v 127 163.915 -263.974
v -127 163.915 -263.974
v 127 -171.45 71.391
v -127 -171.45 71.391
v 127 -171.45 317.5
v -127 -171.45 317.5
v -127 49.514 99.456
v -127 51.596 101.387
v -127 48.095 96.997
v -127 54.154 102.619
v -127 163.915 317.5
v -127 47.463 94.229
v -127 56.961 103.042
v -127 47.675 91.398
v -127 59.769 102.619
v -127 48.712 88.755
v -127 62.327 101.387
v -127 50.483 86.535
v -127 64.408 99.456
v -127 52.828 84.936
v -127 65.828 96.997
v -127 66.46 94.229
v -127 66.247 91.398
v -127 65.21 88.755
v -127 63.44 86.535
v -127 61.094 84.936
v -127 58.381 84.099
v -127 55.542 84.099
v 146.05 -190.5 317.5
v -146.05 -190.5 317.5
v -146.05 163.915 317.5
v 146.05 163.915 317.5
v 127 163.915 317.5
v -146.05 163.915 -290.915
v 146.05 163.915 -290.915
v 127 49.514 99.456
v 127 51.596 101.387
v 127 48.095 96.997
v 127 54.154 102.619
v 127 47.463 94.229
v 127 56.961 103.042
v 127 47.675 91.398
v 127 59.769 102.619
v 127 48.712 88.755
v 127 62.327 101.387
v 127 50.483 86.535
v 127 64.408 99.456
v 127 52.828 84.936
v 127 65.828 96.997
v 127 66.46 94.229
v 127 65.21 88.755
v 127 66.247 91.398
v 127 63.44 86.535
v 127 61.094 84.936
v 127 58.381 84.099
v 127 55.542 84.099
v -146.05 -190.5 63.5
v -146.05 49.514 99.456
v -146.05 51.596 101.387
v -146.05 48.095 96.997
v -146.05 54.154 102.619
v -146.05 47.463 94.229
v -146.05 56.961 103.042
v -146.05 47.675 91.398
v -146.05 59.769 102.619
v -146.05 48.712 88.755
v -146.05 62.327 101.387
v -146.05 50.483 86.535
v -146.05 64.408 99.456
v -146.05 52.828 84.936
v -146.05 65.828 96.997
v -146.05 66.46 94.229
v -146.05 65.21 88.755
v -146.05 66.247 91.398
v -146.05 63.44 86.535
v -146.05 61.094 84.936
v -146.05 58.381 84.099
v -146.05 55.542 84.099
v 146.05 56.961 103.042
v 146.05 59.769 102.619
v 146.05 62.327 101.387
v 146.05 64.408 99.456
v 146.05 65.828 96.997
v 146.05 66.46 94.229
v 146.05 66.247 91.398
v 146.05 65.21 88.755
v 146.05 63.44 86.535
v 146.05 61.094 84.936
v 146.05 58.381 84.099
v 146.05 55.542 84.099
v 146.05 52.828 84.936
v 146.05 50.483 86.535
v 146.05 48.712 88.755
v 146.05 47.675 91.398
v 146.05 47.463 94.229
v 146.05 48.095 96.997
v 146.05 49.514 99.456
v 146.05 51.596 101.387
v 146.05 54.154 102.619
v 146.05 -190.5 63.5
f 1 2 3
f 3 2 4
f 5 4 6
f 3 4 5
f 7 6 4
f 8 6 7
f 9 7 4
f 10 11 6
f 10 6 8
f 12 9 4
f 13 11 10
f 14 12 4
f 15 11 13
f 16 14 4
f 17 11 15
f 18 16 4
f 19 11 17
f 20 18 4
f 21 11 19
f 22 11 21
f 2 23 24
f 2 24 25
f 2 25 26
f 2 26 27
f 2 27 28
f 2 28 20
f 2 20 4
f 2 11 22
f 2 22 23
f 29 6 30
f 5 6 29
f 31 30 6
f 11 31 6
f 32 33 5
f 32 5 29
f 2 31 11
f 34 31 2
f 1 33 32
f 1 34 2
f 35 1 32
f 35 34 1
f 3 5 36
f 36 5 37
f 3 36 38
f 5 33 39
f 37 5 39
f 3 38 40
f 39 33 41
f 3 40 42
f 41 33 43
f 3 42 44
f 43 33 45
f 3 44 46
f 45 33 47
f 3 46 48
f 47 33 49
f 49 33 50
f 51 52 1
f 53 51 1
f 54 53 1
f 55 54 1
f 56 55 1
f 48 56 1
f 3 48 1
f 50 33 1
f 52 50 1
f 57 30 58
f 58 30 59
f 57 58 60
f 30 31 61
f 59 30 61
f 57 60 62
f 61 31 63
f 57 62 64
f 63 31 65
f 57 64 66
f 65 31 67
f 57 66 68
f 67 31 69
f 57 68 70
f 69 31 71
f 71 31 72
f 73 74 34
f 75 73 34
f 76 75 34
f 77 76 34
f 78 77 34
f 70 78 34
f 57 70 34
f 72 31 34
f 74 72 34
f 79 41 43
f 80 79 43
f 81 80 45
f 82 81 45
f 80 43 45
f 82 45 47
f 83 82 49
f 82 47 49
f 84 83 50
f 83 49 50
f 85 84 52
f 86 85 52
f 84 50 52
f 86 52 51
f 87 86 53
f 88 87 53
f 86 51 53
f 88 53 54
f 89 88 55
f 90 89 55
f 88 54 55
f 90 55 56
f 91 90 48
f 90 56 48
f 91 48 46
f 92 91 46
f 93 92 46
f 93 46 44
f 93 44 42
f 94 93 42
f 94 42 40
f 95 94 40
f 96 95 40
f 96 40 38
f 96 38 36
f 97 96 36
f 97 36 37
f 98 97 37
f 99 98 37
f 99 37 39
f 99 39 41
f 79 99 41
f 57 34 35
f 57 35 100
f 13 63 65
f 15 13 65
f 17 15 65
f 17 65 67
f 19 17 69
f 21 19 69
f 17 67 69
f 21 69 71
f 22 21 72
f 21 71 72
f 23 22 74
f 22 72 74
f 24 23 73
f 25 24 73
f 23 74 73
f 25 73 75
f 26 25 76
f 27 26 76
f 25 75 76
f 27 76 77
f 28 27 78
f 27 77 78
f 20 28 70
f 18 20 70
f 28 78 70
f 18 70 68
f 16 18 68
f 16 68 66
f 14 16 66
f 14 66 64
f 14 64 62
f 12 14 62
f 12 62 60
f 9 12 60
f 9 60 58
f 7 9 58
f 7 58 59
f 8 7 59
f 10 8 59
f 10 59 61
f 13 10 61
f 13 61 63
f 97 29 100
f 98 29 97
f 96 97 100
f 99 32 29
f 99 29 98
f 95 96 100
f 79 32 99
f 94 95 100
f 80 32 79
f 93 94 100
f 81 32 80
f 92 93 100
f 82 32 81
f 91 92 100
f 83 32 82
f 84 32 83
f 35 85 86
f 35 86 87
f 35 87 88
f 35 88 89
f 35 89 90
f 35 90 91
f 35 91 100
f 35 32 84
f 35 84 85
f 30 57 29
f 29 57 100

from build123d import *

# Parameters (mm, degrees)
SKETCH2_W           = 292.1
SKETCH2_H           = 635
BOSS_EXTRUDE1_DEPTH = 190.5
CUT_EXTRUDE2_DEPTH  = 381
SHELL1_T            = -19.05
SKETCH5_W           = 292.1
SKETCH5_H           = 635
CUT_EXTRUDE3_DEPTH  = 24.892
SKETCH6_R           = 9.525
CUT_EXTRUDE4_DEPTH  = 514.096
SKETCH10_W          = 292.1
SKETCH10_H          = 610.108
CUT_EXTRUDE7_DEPTH  = 1.693333333


with BuildPart() as part:
    # Sketch2 → Boss-Extrude1 (new body, symmetric)
    with BuildSketch(Plane(origin=(0, 0, 0), x_dir=(1, 0, 0), z_dir=(0, 1, 0))):
        Rectangle(SKETCH2_W, SKETCH2_H)
    extrude(amount=BOSS_EXTRUDE1_DEPTH, both=True)

    # Sketch4 → Cut-Extrude2 (cut)
    with BuildSketch(Plane.ZY.offset(146.05)):
        Polygon((-317.5, 190.5), (63.5, -190.5), (-317.5, -190.5), align=None)
    extrude(amount=-CUT_EXTRUDE2_DEPTH, mode=Mode.SUBTRACT)

    # Shell1
    shell1_openings = [part.faces().sort_by_distance(p)[0] for p in [
        (0, 0, 317.5),
    ]]
    offset(amount=SHELL1_T, openings=shell1_openings, kind=Kind.INTERSECTION)

    # Sketch5 → Cut-Extrude3 (cut)
    with BuildSketch(Plane(origin=(0, 190.5, 0), x_dir=(1, 0, 0), z_dir=(0, 1, 0))):
        Rectangle(SKETCH5_W, SKETCH5_H)
    extrude(amount=-CUT_EXTRUDE3_DEPTH, mode=Mode.SUBTRACT)

    # Sketch6 → Cut-Extrude4 (cut)
    with BuildSketch(Plane.ZY.offset(146.05)):
        with Locations((93.517292524, 56.961208915)):
            Circle(SKETCH6_R)
    extrude(amount=-CUT_EXTRUDE4_DEPTH, mode=Mode.SUBTRACT)

    # Sketch10 → Cut-Extrude7 (cut)
    with BuildSketch(Plane(origin=(0, 165.608, 0), x_dir=(1, 0, 0), z_dir=(0, 1, 0))):
        with Locations((0, -12.446)):
            Rectangle(SKETCH10_W, SKETCH10_H)
    extrude(amount=-CUT_EXTRUDE7_DEPTH, mode=Mode.SUBTRACT)


solid = part.part
